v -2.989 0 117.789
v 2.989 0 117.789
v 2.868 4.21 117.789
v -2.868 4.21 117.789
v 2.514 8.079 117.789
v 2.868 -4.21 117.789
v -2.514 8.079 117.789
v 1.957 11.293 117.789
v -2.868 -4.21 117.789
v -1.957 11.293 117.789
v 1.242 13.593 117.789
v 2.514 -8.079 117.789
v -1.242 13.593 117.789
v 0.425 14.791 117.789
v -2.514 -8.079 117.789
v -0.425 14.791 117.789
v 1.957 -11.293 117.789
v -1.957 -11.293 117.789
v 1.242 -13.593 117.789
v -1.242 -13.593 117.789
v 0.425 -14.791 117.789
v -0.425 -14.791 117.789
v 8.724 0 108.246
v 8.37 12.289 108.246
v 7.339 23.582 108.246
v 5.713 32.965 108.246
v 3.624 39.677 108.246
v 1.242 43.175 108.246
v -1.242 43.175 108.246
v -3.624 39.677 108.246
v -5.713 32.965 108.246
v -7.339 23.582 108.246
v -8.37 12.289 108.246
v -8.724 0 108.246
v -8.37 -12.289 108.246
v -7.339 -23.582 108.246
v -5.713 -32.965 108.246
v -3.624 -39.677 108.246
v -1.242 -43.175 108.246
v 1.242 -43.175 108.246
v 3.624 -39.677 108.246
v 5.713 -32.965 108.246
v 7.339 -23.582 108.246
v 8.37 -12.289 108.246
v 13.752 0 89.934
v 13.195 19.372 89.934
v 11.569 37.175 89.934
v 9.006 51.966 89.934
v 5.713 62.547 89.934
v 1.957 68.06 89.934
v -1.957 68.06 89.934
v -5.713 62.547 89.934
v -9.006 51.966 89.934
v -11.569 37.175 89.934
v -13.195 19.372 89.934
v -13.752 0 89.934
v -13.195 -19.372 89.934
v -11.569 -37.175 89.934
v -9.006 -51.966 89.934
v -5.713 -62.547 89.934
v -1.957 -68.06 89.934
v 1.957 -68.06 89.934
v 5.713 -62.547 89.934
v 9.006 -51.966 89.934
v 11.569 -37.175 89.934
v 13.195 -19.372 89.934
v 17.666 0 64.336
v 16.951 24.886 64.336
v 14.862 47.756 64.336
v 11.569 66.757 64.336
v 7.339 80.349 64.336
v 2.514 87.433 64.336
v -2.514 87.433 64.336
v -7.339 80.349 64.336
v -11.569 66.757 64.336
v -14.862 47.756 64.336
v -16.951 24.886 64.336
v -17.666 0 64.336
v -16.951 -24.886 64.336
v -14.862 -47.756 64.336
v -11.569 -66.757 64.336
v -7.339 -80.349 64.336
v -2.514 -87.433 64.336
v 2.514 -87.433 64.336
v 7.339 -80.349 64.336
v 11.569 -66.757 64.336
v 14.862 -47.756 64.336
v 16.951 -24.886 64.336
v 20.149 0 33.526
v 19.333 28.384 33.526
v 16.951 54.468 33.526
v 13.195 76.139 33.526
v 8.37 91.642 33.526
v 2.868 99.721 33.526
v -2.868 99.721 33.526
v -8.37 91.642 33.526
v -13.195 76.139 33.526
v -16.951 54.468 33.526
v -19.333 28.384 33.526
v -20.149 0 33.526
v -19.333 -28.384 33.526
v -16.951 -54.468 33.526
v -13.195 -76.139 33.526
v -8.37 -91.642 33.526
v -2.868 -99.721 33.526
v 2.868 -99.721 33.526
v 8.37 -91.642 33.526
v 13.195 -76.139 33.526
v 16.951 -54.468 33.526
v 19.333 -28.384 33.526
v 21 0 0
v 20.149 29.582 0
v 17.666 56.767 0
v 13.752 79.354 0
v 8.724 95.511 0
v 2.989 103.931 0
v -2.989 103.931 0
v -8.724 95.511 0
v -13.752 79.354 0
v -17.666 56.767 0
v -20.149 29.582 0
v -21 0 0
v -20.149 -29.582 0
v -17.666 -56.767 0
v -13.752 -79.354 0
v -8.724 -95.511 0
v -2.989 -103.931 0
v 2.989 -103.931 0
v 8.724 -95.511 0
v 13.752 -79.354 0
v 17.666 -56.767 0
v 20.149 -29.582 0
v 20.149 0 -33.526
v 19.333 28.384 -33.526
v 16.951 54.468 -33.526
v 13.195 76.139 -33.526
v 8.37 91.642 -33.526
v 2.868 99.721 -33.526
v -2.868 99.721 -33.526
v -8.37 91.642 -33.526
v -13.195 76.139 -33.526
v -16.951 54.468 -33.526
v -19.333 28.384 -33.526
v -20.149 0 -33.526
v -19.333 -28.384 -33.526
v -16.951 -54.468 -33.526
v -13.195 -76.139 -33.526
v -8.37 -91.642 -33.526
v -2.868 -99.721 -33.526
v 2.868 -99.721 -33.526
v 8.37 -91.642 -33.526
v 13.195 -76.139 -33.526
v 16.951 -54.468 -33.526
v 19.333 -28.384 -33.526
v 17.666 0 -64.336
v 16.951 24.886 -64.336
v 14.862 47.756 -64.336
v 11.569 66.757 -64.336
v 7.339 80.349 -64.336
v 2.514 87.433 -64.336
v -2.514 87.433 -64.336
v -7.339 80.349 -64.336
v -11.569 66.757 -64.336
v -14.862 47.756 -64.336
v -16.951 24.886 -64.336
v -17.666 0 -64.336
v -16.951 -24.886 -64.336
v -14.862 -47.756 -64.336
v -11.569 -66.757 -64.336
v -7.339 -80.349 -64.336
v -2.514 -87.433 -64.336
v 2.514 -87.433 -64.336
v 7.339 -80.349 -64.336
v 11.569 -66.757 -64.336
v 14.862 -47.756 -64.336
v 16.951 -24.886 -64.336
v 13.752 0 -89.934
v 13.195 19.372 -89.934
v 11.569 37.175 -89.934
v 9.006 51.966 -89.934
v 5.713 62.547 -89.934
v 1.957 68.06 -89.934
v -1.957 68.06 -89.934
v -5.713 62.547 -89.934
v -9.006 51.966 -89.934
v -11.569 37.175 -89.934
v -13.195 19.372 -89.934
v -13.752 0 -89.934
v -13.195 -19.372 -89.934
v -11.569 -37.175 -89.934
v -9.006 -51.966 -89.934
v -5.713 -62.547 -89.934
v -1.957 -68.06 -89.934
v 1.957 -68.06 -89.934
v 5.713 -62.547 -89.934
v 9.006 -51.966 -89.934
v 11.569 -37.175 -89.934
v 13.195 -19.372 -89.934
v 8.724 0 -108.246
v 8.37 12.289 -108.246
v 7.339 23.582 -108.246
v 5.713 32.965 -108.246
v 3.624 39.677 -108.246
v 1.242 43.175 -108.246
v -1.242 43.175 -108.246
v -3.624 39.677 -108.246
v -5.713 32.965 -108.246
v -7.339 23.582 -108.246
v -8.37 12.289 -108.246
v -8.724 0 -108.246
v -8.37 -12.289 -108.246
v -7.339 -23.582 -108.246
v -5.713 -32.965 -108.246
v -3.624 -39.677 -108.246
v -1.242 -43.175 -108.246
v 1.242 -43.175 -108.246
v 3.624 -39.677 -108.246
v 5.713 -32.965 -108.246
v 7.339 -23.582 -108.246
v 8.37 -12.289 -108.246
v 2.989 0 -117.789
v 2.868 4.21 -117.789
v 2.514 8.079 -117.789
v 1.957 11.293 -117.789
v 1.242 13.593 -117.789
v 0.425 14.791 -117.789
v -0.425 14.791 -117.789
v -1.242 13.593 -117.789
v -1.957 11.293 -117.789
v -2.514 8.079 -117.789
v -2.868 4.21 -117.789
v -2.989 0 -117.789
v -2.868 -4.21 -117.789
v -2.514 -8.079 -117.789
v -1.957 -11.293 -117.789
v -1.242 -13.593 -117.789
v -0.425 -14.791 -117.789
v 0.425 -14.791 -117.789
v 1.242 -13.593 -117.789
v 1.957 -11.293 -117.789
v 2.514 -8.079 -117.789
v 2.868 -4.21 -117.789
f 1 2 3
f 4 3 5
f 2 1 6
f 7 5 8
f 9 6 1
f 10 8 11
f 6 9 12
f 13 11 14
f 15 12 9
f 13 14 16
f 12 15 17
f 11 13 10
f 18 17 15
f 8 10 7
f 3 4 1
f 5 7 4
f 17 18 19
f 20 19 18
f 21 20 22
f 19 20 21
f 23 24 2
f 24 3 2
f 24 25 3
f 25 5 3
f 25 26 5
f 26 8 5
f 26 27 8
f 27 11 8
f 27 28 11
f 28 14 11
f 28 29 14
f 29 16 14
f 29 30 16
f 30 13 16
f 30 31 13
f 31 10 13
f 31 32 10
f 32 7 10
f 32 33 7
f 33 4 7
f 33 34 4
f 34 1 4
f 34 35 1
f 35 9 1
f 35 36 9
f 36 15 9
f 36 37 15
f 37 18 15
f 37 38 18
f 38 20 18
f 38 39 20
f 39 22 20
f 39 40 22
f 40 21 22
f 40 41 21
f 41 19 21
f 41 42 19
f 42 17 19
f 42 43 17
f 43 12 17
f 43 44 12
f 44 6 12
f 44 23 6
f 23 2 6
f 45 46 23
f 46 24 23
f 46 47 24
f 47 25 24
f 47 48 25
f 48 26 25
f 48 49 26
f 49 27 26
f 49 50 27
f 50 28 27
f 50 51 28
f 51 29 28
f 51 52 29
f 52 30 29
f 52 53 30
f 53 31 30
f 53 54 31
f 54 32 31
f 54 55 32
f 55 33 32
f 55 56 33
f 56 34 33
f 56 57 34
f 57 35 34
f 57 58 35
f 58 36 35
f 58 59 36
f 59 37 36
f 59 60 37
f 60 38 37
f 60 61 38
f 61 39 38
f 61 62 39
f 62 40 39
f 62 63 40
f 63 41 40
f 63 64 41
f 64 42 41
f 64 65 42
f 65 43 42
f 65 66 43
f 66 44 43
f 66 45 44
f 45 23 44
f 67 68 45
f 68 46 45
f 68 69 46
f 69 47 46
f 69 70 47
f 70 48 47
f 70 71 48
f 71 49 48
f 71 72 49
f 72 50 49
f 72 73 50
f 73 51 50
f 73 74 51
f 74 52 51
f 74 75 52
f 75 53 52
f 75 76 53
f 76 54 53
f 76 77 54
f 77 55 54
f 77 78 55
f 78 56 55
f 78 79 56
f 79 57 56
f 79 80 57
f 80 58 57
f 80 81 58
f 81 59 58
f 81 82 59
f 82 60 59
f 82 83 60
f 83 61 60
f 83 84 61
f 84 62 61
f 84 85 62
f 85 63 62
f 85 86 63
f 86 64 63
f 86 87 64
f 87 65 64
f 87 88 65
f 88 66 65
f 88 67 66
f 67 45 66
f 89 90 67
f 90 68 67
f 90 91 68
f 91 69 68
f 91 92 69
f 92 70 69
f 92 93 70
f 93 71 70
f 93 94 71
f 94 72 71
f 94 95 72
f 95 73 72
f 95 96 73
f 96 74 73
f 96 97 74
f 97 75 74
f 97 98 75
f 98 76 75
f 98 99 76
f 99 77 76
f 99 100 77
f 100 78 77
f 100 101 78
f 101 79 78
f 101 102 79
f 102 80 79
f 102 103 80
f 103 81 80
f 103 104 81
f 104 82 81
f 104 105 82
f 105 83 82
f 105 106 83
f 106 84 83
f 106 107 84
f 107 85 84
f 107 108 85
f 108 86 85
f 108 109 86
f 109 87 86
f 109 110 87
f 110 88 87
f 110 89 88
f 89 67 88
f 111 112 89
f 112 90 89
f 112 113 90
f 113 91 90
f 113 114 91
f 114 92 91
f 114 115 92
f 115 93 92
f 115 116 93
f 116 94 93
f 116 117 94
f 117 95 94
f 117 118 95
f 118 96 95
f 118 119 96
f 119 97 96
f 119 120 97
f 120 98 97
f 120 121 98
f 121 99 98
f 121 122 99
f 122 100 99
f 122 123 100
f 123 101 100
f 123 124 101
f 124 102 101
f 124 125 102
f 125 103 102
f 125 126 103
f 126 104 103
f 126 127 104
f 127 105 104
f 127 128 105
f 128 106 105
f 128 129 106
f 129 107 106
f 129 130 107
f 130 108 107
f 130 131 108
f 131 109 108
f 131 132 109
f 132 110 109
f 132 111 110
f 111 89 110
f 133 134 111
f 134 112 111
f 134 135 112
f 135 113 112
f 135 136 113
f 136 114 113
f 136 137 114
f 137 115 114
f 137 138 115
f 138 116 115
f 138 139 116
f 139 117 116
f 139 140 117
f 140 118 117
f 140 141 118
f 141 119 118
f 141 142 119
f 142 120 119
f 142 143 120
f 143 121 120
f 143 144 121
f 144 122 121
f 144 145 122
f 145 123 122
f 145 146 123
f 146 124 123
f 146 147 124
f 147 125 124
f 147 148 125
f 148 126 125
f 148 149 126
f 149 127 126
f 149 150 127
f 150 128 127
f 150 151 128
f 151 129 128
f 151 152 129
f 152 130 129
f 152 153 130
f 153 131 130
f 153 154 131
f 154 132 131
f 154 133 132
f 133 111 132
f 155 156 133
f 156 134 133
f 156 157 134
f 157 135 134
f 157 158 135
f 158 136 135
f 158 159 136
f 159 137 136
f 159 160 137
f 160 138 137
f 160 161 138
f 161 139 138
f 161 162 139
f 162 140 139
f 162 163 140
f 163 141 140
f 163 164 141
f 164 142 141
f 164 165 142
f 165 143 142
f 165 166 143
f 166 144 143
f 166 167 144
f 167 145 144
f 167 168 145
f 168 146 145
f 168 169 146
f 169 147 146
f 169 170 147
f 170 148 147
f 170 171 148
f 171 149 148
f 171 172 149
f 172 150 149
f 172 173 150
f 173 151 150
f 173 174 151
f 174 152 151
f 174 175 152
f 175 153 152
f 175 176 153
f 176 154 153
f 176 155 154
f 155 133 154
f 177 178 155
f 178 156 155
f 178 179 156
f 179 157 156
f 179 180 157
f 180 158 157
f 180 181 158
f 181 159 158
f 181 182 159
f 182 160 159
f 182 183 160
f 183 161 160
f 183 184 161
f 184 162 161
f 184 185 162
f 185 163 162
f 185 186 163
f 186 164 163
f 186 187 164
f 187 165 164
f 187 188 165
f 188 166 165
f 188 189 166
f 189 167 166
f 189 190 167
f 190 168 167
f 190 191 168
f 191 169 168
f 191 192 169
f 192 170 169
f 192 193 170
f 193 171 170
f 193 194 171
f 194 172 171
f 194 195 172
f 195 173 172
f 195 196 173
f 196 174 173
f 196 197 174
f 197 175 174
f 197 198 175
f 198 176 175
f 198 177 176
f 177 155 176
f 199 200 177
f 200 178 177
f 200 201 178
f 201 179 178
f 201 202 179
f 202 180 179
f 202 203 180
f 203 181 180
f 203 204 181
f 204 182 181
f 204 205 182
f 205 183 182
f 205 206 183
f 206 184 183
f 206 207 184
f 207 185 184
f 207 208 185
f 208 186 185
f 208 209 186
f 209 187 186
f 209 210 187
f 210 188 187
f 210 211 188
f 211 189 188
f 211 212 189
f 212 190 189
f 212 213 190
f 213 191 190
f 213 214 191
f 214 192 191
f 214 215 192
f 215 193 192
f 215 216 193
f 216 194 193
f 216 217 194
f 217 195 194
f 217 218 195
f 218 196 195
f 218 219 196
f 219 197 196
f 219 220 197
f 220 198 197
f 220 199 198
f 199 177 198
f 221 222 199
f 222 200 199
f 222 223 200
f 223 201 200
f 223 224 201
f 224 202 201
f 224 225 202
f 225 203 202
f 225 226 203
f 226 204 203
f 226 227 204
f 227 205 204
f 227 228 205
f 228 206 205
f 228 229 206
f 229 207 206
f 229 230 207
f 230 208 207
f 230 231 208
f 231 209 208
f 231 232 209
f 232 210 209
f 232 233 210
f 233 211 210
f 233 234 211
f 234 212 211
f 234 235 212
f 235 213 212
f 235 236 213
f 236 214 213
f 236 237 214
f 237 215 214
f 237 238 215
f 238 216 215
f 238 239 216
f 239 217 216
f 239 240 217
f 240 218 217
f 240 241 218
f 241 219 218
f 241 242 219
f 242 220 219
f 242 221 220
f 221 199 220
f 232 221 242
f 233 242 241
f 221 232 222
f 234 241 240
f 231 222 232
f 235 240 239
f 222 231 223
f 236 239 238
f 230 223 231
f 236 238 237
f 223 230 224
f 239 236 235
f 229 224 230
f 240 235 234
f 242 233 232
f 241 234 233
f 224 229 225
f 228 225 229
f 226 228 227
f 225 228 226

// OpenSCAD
// Generated by SolidPython 1.0.1 on 2020-07-29 00:46:45


scale(v = [3, 15, 17]) {
	sphere(r = 7);
}
/***********************************************
*********      SolidPython code:      **********
************************************************
 
# import packages: SolidPython
from solid import *
from solid.utils import *
from itertools import chain, combinations, permutations


class Resize:

    def __init__(self, scad_file):
        self.scad_file = scad_file
        #self.scad_file = import_scad(scad_file)
        # cone/cylinder param:
        self.r1 = 0
        self.r2 = 0
        self.h = 0
        # rectangular prism param:
        self.w = 0
        self.l = 0
        # ellipse param:
        self.r = 0

    # import OpenScad code (file name corresponds to shape)


    # classify shape + parameters
    def assign(self, param1, param2, param3):
        if self.scad_file == 'cone.scad':
            self.r1 = param1
            self.r2 = param2
            self.h = param3
        elif self.scad_file == 'cylinder.scad':
            self.r1 = param1
            self.r2 = param2
            self.h = param3
        elif self.scad_file == 'rectangularPrism.scad':
            self.h = param1
            self.l = param2
            self.w = param3
        else:
            self.r = param1
            self.h = param2

    # resize parameters
    def iterate(self):
        x = range(3, 20, 2)
        i = 1
        if self.scad_file == 'cone.scad':
            tempList = list(permutations(x, 2))
            for temp in tempList:
                param1 = temp[0]
                param2 = temp[1]
                filepath = 'produced_scad_files/' + 'cone' + str(param1) + '_' + str(param2) + '_' + '.scad'
                scad_render_to_file(cylinder(h=param1, r1=param2, r2=0), filepath)

        elif self.scad_file == 'cylinder.scad':
            tempList = list(permutations(x, 3))
            for temp in tempList:
                param1 = temp[0]
                param2 = temp[1]
                filepath = 'produced_scad_files/' + 'cylinder' + str(param1) + '_' + str(param2) + '_' + '.scad'
                scad_render_to_file(cylinder(h=param1, r1=param2, r2=param2), filepath)

        elif self.scad_file == 'rectangularPrism.scad':
            tempList = list(permutations(x, 3))
            for temp in tempList:
                param1 = temp[0]
                param2 = temp[1]
                param3 = temp[2]
                filepath = 'produced_scad_files/' + 'rectangularPrism' + str(param1) + '_' + str(param2) + '_' + str(
                    param3) + '.scad'
                scad_render_to_file(cube(size=(param1, param2, param3)), filepath)

        elif self.scad_file == 'ellipse.scad':
            tempList = list(permutations(x, 4))
            for temp in tempList:
                param1 = temp[0]
                param2 = temp[1]
                param3 = temp[2]
                param4 = temp[3]
                filepath = 'produced_scad_files/' + 'ellipse' + str(param1) + '_' + str(param2) + '_' + str(param3) + '_' + str(param4) + '.scad'
                scad_render_to_file(scale([param1, param2, param3])(sphere(r=param4)), filepath)

    def render_to_scadfile(self):
        scad_render_to_file(scad, 'example.scad') 
 
************************************************/
